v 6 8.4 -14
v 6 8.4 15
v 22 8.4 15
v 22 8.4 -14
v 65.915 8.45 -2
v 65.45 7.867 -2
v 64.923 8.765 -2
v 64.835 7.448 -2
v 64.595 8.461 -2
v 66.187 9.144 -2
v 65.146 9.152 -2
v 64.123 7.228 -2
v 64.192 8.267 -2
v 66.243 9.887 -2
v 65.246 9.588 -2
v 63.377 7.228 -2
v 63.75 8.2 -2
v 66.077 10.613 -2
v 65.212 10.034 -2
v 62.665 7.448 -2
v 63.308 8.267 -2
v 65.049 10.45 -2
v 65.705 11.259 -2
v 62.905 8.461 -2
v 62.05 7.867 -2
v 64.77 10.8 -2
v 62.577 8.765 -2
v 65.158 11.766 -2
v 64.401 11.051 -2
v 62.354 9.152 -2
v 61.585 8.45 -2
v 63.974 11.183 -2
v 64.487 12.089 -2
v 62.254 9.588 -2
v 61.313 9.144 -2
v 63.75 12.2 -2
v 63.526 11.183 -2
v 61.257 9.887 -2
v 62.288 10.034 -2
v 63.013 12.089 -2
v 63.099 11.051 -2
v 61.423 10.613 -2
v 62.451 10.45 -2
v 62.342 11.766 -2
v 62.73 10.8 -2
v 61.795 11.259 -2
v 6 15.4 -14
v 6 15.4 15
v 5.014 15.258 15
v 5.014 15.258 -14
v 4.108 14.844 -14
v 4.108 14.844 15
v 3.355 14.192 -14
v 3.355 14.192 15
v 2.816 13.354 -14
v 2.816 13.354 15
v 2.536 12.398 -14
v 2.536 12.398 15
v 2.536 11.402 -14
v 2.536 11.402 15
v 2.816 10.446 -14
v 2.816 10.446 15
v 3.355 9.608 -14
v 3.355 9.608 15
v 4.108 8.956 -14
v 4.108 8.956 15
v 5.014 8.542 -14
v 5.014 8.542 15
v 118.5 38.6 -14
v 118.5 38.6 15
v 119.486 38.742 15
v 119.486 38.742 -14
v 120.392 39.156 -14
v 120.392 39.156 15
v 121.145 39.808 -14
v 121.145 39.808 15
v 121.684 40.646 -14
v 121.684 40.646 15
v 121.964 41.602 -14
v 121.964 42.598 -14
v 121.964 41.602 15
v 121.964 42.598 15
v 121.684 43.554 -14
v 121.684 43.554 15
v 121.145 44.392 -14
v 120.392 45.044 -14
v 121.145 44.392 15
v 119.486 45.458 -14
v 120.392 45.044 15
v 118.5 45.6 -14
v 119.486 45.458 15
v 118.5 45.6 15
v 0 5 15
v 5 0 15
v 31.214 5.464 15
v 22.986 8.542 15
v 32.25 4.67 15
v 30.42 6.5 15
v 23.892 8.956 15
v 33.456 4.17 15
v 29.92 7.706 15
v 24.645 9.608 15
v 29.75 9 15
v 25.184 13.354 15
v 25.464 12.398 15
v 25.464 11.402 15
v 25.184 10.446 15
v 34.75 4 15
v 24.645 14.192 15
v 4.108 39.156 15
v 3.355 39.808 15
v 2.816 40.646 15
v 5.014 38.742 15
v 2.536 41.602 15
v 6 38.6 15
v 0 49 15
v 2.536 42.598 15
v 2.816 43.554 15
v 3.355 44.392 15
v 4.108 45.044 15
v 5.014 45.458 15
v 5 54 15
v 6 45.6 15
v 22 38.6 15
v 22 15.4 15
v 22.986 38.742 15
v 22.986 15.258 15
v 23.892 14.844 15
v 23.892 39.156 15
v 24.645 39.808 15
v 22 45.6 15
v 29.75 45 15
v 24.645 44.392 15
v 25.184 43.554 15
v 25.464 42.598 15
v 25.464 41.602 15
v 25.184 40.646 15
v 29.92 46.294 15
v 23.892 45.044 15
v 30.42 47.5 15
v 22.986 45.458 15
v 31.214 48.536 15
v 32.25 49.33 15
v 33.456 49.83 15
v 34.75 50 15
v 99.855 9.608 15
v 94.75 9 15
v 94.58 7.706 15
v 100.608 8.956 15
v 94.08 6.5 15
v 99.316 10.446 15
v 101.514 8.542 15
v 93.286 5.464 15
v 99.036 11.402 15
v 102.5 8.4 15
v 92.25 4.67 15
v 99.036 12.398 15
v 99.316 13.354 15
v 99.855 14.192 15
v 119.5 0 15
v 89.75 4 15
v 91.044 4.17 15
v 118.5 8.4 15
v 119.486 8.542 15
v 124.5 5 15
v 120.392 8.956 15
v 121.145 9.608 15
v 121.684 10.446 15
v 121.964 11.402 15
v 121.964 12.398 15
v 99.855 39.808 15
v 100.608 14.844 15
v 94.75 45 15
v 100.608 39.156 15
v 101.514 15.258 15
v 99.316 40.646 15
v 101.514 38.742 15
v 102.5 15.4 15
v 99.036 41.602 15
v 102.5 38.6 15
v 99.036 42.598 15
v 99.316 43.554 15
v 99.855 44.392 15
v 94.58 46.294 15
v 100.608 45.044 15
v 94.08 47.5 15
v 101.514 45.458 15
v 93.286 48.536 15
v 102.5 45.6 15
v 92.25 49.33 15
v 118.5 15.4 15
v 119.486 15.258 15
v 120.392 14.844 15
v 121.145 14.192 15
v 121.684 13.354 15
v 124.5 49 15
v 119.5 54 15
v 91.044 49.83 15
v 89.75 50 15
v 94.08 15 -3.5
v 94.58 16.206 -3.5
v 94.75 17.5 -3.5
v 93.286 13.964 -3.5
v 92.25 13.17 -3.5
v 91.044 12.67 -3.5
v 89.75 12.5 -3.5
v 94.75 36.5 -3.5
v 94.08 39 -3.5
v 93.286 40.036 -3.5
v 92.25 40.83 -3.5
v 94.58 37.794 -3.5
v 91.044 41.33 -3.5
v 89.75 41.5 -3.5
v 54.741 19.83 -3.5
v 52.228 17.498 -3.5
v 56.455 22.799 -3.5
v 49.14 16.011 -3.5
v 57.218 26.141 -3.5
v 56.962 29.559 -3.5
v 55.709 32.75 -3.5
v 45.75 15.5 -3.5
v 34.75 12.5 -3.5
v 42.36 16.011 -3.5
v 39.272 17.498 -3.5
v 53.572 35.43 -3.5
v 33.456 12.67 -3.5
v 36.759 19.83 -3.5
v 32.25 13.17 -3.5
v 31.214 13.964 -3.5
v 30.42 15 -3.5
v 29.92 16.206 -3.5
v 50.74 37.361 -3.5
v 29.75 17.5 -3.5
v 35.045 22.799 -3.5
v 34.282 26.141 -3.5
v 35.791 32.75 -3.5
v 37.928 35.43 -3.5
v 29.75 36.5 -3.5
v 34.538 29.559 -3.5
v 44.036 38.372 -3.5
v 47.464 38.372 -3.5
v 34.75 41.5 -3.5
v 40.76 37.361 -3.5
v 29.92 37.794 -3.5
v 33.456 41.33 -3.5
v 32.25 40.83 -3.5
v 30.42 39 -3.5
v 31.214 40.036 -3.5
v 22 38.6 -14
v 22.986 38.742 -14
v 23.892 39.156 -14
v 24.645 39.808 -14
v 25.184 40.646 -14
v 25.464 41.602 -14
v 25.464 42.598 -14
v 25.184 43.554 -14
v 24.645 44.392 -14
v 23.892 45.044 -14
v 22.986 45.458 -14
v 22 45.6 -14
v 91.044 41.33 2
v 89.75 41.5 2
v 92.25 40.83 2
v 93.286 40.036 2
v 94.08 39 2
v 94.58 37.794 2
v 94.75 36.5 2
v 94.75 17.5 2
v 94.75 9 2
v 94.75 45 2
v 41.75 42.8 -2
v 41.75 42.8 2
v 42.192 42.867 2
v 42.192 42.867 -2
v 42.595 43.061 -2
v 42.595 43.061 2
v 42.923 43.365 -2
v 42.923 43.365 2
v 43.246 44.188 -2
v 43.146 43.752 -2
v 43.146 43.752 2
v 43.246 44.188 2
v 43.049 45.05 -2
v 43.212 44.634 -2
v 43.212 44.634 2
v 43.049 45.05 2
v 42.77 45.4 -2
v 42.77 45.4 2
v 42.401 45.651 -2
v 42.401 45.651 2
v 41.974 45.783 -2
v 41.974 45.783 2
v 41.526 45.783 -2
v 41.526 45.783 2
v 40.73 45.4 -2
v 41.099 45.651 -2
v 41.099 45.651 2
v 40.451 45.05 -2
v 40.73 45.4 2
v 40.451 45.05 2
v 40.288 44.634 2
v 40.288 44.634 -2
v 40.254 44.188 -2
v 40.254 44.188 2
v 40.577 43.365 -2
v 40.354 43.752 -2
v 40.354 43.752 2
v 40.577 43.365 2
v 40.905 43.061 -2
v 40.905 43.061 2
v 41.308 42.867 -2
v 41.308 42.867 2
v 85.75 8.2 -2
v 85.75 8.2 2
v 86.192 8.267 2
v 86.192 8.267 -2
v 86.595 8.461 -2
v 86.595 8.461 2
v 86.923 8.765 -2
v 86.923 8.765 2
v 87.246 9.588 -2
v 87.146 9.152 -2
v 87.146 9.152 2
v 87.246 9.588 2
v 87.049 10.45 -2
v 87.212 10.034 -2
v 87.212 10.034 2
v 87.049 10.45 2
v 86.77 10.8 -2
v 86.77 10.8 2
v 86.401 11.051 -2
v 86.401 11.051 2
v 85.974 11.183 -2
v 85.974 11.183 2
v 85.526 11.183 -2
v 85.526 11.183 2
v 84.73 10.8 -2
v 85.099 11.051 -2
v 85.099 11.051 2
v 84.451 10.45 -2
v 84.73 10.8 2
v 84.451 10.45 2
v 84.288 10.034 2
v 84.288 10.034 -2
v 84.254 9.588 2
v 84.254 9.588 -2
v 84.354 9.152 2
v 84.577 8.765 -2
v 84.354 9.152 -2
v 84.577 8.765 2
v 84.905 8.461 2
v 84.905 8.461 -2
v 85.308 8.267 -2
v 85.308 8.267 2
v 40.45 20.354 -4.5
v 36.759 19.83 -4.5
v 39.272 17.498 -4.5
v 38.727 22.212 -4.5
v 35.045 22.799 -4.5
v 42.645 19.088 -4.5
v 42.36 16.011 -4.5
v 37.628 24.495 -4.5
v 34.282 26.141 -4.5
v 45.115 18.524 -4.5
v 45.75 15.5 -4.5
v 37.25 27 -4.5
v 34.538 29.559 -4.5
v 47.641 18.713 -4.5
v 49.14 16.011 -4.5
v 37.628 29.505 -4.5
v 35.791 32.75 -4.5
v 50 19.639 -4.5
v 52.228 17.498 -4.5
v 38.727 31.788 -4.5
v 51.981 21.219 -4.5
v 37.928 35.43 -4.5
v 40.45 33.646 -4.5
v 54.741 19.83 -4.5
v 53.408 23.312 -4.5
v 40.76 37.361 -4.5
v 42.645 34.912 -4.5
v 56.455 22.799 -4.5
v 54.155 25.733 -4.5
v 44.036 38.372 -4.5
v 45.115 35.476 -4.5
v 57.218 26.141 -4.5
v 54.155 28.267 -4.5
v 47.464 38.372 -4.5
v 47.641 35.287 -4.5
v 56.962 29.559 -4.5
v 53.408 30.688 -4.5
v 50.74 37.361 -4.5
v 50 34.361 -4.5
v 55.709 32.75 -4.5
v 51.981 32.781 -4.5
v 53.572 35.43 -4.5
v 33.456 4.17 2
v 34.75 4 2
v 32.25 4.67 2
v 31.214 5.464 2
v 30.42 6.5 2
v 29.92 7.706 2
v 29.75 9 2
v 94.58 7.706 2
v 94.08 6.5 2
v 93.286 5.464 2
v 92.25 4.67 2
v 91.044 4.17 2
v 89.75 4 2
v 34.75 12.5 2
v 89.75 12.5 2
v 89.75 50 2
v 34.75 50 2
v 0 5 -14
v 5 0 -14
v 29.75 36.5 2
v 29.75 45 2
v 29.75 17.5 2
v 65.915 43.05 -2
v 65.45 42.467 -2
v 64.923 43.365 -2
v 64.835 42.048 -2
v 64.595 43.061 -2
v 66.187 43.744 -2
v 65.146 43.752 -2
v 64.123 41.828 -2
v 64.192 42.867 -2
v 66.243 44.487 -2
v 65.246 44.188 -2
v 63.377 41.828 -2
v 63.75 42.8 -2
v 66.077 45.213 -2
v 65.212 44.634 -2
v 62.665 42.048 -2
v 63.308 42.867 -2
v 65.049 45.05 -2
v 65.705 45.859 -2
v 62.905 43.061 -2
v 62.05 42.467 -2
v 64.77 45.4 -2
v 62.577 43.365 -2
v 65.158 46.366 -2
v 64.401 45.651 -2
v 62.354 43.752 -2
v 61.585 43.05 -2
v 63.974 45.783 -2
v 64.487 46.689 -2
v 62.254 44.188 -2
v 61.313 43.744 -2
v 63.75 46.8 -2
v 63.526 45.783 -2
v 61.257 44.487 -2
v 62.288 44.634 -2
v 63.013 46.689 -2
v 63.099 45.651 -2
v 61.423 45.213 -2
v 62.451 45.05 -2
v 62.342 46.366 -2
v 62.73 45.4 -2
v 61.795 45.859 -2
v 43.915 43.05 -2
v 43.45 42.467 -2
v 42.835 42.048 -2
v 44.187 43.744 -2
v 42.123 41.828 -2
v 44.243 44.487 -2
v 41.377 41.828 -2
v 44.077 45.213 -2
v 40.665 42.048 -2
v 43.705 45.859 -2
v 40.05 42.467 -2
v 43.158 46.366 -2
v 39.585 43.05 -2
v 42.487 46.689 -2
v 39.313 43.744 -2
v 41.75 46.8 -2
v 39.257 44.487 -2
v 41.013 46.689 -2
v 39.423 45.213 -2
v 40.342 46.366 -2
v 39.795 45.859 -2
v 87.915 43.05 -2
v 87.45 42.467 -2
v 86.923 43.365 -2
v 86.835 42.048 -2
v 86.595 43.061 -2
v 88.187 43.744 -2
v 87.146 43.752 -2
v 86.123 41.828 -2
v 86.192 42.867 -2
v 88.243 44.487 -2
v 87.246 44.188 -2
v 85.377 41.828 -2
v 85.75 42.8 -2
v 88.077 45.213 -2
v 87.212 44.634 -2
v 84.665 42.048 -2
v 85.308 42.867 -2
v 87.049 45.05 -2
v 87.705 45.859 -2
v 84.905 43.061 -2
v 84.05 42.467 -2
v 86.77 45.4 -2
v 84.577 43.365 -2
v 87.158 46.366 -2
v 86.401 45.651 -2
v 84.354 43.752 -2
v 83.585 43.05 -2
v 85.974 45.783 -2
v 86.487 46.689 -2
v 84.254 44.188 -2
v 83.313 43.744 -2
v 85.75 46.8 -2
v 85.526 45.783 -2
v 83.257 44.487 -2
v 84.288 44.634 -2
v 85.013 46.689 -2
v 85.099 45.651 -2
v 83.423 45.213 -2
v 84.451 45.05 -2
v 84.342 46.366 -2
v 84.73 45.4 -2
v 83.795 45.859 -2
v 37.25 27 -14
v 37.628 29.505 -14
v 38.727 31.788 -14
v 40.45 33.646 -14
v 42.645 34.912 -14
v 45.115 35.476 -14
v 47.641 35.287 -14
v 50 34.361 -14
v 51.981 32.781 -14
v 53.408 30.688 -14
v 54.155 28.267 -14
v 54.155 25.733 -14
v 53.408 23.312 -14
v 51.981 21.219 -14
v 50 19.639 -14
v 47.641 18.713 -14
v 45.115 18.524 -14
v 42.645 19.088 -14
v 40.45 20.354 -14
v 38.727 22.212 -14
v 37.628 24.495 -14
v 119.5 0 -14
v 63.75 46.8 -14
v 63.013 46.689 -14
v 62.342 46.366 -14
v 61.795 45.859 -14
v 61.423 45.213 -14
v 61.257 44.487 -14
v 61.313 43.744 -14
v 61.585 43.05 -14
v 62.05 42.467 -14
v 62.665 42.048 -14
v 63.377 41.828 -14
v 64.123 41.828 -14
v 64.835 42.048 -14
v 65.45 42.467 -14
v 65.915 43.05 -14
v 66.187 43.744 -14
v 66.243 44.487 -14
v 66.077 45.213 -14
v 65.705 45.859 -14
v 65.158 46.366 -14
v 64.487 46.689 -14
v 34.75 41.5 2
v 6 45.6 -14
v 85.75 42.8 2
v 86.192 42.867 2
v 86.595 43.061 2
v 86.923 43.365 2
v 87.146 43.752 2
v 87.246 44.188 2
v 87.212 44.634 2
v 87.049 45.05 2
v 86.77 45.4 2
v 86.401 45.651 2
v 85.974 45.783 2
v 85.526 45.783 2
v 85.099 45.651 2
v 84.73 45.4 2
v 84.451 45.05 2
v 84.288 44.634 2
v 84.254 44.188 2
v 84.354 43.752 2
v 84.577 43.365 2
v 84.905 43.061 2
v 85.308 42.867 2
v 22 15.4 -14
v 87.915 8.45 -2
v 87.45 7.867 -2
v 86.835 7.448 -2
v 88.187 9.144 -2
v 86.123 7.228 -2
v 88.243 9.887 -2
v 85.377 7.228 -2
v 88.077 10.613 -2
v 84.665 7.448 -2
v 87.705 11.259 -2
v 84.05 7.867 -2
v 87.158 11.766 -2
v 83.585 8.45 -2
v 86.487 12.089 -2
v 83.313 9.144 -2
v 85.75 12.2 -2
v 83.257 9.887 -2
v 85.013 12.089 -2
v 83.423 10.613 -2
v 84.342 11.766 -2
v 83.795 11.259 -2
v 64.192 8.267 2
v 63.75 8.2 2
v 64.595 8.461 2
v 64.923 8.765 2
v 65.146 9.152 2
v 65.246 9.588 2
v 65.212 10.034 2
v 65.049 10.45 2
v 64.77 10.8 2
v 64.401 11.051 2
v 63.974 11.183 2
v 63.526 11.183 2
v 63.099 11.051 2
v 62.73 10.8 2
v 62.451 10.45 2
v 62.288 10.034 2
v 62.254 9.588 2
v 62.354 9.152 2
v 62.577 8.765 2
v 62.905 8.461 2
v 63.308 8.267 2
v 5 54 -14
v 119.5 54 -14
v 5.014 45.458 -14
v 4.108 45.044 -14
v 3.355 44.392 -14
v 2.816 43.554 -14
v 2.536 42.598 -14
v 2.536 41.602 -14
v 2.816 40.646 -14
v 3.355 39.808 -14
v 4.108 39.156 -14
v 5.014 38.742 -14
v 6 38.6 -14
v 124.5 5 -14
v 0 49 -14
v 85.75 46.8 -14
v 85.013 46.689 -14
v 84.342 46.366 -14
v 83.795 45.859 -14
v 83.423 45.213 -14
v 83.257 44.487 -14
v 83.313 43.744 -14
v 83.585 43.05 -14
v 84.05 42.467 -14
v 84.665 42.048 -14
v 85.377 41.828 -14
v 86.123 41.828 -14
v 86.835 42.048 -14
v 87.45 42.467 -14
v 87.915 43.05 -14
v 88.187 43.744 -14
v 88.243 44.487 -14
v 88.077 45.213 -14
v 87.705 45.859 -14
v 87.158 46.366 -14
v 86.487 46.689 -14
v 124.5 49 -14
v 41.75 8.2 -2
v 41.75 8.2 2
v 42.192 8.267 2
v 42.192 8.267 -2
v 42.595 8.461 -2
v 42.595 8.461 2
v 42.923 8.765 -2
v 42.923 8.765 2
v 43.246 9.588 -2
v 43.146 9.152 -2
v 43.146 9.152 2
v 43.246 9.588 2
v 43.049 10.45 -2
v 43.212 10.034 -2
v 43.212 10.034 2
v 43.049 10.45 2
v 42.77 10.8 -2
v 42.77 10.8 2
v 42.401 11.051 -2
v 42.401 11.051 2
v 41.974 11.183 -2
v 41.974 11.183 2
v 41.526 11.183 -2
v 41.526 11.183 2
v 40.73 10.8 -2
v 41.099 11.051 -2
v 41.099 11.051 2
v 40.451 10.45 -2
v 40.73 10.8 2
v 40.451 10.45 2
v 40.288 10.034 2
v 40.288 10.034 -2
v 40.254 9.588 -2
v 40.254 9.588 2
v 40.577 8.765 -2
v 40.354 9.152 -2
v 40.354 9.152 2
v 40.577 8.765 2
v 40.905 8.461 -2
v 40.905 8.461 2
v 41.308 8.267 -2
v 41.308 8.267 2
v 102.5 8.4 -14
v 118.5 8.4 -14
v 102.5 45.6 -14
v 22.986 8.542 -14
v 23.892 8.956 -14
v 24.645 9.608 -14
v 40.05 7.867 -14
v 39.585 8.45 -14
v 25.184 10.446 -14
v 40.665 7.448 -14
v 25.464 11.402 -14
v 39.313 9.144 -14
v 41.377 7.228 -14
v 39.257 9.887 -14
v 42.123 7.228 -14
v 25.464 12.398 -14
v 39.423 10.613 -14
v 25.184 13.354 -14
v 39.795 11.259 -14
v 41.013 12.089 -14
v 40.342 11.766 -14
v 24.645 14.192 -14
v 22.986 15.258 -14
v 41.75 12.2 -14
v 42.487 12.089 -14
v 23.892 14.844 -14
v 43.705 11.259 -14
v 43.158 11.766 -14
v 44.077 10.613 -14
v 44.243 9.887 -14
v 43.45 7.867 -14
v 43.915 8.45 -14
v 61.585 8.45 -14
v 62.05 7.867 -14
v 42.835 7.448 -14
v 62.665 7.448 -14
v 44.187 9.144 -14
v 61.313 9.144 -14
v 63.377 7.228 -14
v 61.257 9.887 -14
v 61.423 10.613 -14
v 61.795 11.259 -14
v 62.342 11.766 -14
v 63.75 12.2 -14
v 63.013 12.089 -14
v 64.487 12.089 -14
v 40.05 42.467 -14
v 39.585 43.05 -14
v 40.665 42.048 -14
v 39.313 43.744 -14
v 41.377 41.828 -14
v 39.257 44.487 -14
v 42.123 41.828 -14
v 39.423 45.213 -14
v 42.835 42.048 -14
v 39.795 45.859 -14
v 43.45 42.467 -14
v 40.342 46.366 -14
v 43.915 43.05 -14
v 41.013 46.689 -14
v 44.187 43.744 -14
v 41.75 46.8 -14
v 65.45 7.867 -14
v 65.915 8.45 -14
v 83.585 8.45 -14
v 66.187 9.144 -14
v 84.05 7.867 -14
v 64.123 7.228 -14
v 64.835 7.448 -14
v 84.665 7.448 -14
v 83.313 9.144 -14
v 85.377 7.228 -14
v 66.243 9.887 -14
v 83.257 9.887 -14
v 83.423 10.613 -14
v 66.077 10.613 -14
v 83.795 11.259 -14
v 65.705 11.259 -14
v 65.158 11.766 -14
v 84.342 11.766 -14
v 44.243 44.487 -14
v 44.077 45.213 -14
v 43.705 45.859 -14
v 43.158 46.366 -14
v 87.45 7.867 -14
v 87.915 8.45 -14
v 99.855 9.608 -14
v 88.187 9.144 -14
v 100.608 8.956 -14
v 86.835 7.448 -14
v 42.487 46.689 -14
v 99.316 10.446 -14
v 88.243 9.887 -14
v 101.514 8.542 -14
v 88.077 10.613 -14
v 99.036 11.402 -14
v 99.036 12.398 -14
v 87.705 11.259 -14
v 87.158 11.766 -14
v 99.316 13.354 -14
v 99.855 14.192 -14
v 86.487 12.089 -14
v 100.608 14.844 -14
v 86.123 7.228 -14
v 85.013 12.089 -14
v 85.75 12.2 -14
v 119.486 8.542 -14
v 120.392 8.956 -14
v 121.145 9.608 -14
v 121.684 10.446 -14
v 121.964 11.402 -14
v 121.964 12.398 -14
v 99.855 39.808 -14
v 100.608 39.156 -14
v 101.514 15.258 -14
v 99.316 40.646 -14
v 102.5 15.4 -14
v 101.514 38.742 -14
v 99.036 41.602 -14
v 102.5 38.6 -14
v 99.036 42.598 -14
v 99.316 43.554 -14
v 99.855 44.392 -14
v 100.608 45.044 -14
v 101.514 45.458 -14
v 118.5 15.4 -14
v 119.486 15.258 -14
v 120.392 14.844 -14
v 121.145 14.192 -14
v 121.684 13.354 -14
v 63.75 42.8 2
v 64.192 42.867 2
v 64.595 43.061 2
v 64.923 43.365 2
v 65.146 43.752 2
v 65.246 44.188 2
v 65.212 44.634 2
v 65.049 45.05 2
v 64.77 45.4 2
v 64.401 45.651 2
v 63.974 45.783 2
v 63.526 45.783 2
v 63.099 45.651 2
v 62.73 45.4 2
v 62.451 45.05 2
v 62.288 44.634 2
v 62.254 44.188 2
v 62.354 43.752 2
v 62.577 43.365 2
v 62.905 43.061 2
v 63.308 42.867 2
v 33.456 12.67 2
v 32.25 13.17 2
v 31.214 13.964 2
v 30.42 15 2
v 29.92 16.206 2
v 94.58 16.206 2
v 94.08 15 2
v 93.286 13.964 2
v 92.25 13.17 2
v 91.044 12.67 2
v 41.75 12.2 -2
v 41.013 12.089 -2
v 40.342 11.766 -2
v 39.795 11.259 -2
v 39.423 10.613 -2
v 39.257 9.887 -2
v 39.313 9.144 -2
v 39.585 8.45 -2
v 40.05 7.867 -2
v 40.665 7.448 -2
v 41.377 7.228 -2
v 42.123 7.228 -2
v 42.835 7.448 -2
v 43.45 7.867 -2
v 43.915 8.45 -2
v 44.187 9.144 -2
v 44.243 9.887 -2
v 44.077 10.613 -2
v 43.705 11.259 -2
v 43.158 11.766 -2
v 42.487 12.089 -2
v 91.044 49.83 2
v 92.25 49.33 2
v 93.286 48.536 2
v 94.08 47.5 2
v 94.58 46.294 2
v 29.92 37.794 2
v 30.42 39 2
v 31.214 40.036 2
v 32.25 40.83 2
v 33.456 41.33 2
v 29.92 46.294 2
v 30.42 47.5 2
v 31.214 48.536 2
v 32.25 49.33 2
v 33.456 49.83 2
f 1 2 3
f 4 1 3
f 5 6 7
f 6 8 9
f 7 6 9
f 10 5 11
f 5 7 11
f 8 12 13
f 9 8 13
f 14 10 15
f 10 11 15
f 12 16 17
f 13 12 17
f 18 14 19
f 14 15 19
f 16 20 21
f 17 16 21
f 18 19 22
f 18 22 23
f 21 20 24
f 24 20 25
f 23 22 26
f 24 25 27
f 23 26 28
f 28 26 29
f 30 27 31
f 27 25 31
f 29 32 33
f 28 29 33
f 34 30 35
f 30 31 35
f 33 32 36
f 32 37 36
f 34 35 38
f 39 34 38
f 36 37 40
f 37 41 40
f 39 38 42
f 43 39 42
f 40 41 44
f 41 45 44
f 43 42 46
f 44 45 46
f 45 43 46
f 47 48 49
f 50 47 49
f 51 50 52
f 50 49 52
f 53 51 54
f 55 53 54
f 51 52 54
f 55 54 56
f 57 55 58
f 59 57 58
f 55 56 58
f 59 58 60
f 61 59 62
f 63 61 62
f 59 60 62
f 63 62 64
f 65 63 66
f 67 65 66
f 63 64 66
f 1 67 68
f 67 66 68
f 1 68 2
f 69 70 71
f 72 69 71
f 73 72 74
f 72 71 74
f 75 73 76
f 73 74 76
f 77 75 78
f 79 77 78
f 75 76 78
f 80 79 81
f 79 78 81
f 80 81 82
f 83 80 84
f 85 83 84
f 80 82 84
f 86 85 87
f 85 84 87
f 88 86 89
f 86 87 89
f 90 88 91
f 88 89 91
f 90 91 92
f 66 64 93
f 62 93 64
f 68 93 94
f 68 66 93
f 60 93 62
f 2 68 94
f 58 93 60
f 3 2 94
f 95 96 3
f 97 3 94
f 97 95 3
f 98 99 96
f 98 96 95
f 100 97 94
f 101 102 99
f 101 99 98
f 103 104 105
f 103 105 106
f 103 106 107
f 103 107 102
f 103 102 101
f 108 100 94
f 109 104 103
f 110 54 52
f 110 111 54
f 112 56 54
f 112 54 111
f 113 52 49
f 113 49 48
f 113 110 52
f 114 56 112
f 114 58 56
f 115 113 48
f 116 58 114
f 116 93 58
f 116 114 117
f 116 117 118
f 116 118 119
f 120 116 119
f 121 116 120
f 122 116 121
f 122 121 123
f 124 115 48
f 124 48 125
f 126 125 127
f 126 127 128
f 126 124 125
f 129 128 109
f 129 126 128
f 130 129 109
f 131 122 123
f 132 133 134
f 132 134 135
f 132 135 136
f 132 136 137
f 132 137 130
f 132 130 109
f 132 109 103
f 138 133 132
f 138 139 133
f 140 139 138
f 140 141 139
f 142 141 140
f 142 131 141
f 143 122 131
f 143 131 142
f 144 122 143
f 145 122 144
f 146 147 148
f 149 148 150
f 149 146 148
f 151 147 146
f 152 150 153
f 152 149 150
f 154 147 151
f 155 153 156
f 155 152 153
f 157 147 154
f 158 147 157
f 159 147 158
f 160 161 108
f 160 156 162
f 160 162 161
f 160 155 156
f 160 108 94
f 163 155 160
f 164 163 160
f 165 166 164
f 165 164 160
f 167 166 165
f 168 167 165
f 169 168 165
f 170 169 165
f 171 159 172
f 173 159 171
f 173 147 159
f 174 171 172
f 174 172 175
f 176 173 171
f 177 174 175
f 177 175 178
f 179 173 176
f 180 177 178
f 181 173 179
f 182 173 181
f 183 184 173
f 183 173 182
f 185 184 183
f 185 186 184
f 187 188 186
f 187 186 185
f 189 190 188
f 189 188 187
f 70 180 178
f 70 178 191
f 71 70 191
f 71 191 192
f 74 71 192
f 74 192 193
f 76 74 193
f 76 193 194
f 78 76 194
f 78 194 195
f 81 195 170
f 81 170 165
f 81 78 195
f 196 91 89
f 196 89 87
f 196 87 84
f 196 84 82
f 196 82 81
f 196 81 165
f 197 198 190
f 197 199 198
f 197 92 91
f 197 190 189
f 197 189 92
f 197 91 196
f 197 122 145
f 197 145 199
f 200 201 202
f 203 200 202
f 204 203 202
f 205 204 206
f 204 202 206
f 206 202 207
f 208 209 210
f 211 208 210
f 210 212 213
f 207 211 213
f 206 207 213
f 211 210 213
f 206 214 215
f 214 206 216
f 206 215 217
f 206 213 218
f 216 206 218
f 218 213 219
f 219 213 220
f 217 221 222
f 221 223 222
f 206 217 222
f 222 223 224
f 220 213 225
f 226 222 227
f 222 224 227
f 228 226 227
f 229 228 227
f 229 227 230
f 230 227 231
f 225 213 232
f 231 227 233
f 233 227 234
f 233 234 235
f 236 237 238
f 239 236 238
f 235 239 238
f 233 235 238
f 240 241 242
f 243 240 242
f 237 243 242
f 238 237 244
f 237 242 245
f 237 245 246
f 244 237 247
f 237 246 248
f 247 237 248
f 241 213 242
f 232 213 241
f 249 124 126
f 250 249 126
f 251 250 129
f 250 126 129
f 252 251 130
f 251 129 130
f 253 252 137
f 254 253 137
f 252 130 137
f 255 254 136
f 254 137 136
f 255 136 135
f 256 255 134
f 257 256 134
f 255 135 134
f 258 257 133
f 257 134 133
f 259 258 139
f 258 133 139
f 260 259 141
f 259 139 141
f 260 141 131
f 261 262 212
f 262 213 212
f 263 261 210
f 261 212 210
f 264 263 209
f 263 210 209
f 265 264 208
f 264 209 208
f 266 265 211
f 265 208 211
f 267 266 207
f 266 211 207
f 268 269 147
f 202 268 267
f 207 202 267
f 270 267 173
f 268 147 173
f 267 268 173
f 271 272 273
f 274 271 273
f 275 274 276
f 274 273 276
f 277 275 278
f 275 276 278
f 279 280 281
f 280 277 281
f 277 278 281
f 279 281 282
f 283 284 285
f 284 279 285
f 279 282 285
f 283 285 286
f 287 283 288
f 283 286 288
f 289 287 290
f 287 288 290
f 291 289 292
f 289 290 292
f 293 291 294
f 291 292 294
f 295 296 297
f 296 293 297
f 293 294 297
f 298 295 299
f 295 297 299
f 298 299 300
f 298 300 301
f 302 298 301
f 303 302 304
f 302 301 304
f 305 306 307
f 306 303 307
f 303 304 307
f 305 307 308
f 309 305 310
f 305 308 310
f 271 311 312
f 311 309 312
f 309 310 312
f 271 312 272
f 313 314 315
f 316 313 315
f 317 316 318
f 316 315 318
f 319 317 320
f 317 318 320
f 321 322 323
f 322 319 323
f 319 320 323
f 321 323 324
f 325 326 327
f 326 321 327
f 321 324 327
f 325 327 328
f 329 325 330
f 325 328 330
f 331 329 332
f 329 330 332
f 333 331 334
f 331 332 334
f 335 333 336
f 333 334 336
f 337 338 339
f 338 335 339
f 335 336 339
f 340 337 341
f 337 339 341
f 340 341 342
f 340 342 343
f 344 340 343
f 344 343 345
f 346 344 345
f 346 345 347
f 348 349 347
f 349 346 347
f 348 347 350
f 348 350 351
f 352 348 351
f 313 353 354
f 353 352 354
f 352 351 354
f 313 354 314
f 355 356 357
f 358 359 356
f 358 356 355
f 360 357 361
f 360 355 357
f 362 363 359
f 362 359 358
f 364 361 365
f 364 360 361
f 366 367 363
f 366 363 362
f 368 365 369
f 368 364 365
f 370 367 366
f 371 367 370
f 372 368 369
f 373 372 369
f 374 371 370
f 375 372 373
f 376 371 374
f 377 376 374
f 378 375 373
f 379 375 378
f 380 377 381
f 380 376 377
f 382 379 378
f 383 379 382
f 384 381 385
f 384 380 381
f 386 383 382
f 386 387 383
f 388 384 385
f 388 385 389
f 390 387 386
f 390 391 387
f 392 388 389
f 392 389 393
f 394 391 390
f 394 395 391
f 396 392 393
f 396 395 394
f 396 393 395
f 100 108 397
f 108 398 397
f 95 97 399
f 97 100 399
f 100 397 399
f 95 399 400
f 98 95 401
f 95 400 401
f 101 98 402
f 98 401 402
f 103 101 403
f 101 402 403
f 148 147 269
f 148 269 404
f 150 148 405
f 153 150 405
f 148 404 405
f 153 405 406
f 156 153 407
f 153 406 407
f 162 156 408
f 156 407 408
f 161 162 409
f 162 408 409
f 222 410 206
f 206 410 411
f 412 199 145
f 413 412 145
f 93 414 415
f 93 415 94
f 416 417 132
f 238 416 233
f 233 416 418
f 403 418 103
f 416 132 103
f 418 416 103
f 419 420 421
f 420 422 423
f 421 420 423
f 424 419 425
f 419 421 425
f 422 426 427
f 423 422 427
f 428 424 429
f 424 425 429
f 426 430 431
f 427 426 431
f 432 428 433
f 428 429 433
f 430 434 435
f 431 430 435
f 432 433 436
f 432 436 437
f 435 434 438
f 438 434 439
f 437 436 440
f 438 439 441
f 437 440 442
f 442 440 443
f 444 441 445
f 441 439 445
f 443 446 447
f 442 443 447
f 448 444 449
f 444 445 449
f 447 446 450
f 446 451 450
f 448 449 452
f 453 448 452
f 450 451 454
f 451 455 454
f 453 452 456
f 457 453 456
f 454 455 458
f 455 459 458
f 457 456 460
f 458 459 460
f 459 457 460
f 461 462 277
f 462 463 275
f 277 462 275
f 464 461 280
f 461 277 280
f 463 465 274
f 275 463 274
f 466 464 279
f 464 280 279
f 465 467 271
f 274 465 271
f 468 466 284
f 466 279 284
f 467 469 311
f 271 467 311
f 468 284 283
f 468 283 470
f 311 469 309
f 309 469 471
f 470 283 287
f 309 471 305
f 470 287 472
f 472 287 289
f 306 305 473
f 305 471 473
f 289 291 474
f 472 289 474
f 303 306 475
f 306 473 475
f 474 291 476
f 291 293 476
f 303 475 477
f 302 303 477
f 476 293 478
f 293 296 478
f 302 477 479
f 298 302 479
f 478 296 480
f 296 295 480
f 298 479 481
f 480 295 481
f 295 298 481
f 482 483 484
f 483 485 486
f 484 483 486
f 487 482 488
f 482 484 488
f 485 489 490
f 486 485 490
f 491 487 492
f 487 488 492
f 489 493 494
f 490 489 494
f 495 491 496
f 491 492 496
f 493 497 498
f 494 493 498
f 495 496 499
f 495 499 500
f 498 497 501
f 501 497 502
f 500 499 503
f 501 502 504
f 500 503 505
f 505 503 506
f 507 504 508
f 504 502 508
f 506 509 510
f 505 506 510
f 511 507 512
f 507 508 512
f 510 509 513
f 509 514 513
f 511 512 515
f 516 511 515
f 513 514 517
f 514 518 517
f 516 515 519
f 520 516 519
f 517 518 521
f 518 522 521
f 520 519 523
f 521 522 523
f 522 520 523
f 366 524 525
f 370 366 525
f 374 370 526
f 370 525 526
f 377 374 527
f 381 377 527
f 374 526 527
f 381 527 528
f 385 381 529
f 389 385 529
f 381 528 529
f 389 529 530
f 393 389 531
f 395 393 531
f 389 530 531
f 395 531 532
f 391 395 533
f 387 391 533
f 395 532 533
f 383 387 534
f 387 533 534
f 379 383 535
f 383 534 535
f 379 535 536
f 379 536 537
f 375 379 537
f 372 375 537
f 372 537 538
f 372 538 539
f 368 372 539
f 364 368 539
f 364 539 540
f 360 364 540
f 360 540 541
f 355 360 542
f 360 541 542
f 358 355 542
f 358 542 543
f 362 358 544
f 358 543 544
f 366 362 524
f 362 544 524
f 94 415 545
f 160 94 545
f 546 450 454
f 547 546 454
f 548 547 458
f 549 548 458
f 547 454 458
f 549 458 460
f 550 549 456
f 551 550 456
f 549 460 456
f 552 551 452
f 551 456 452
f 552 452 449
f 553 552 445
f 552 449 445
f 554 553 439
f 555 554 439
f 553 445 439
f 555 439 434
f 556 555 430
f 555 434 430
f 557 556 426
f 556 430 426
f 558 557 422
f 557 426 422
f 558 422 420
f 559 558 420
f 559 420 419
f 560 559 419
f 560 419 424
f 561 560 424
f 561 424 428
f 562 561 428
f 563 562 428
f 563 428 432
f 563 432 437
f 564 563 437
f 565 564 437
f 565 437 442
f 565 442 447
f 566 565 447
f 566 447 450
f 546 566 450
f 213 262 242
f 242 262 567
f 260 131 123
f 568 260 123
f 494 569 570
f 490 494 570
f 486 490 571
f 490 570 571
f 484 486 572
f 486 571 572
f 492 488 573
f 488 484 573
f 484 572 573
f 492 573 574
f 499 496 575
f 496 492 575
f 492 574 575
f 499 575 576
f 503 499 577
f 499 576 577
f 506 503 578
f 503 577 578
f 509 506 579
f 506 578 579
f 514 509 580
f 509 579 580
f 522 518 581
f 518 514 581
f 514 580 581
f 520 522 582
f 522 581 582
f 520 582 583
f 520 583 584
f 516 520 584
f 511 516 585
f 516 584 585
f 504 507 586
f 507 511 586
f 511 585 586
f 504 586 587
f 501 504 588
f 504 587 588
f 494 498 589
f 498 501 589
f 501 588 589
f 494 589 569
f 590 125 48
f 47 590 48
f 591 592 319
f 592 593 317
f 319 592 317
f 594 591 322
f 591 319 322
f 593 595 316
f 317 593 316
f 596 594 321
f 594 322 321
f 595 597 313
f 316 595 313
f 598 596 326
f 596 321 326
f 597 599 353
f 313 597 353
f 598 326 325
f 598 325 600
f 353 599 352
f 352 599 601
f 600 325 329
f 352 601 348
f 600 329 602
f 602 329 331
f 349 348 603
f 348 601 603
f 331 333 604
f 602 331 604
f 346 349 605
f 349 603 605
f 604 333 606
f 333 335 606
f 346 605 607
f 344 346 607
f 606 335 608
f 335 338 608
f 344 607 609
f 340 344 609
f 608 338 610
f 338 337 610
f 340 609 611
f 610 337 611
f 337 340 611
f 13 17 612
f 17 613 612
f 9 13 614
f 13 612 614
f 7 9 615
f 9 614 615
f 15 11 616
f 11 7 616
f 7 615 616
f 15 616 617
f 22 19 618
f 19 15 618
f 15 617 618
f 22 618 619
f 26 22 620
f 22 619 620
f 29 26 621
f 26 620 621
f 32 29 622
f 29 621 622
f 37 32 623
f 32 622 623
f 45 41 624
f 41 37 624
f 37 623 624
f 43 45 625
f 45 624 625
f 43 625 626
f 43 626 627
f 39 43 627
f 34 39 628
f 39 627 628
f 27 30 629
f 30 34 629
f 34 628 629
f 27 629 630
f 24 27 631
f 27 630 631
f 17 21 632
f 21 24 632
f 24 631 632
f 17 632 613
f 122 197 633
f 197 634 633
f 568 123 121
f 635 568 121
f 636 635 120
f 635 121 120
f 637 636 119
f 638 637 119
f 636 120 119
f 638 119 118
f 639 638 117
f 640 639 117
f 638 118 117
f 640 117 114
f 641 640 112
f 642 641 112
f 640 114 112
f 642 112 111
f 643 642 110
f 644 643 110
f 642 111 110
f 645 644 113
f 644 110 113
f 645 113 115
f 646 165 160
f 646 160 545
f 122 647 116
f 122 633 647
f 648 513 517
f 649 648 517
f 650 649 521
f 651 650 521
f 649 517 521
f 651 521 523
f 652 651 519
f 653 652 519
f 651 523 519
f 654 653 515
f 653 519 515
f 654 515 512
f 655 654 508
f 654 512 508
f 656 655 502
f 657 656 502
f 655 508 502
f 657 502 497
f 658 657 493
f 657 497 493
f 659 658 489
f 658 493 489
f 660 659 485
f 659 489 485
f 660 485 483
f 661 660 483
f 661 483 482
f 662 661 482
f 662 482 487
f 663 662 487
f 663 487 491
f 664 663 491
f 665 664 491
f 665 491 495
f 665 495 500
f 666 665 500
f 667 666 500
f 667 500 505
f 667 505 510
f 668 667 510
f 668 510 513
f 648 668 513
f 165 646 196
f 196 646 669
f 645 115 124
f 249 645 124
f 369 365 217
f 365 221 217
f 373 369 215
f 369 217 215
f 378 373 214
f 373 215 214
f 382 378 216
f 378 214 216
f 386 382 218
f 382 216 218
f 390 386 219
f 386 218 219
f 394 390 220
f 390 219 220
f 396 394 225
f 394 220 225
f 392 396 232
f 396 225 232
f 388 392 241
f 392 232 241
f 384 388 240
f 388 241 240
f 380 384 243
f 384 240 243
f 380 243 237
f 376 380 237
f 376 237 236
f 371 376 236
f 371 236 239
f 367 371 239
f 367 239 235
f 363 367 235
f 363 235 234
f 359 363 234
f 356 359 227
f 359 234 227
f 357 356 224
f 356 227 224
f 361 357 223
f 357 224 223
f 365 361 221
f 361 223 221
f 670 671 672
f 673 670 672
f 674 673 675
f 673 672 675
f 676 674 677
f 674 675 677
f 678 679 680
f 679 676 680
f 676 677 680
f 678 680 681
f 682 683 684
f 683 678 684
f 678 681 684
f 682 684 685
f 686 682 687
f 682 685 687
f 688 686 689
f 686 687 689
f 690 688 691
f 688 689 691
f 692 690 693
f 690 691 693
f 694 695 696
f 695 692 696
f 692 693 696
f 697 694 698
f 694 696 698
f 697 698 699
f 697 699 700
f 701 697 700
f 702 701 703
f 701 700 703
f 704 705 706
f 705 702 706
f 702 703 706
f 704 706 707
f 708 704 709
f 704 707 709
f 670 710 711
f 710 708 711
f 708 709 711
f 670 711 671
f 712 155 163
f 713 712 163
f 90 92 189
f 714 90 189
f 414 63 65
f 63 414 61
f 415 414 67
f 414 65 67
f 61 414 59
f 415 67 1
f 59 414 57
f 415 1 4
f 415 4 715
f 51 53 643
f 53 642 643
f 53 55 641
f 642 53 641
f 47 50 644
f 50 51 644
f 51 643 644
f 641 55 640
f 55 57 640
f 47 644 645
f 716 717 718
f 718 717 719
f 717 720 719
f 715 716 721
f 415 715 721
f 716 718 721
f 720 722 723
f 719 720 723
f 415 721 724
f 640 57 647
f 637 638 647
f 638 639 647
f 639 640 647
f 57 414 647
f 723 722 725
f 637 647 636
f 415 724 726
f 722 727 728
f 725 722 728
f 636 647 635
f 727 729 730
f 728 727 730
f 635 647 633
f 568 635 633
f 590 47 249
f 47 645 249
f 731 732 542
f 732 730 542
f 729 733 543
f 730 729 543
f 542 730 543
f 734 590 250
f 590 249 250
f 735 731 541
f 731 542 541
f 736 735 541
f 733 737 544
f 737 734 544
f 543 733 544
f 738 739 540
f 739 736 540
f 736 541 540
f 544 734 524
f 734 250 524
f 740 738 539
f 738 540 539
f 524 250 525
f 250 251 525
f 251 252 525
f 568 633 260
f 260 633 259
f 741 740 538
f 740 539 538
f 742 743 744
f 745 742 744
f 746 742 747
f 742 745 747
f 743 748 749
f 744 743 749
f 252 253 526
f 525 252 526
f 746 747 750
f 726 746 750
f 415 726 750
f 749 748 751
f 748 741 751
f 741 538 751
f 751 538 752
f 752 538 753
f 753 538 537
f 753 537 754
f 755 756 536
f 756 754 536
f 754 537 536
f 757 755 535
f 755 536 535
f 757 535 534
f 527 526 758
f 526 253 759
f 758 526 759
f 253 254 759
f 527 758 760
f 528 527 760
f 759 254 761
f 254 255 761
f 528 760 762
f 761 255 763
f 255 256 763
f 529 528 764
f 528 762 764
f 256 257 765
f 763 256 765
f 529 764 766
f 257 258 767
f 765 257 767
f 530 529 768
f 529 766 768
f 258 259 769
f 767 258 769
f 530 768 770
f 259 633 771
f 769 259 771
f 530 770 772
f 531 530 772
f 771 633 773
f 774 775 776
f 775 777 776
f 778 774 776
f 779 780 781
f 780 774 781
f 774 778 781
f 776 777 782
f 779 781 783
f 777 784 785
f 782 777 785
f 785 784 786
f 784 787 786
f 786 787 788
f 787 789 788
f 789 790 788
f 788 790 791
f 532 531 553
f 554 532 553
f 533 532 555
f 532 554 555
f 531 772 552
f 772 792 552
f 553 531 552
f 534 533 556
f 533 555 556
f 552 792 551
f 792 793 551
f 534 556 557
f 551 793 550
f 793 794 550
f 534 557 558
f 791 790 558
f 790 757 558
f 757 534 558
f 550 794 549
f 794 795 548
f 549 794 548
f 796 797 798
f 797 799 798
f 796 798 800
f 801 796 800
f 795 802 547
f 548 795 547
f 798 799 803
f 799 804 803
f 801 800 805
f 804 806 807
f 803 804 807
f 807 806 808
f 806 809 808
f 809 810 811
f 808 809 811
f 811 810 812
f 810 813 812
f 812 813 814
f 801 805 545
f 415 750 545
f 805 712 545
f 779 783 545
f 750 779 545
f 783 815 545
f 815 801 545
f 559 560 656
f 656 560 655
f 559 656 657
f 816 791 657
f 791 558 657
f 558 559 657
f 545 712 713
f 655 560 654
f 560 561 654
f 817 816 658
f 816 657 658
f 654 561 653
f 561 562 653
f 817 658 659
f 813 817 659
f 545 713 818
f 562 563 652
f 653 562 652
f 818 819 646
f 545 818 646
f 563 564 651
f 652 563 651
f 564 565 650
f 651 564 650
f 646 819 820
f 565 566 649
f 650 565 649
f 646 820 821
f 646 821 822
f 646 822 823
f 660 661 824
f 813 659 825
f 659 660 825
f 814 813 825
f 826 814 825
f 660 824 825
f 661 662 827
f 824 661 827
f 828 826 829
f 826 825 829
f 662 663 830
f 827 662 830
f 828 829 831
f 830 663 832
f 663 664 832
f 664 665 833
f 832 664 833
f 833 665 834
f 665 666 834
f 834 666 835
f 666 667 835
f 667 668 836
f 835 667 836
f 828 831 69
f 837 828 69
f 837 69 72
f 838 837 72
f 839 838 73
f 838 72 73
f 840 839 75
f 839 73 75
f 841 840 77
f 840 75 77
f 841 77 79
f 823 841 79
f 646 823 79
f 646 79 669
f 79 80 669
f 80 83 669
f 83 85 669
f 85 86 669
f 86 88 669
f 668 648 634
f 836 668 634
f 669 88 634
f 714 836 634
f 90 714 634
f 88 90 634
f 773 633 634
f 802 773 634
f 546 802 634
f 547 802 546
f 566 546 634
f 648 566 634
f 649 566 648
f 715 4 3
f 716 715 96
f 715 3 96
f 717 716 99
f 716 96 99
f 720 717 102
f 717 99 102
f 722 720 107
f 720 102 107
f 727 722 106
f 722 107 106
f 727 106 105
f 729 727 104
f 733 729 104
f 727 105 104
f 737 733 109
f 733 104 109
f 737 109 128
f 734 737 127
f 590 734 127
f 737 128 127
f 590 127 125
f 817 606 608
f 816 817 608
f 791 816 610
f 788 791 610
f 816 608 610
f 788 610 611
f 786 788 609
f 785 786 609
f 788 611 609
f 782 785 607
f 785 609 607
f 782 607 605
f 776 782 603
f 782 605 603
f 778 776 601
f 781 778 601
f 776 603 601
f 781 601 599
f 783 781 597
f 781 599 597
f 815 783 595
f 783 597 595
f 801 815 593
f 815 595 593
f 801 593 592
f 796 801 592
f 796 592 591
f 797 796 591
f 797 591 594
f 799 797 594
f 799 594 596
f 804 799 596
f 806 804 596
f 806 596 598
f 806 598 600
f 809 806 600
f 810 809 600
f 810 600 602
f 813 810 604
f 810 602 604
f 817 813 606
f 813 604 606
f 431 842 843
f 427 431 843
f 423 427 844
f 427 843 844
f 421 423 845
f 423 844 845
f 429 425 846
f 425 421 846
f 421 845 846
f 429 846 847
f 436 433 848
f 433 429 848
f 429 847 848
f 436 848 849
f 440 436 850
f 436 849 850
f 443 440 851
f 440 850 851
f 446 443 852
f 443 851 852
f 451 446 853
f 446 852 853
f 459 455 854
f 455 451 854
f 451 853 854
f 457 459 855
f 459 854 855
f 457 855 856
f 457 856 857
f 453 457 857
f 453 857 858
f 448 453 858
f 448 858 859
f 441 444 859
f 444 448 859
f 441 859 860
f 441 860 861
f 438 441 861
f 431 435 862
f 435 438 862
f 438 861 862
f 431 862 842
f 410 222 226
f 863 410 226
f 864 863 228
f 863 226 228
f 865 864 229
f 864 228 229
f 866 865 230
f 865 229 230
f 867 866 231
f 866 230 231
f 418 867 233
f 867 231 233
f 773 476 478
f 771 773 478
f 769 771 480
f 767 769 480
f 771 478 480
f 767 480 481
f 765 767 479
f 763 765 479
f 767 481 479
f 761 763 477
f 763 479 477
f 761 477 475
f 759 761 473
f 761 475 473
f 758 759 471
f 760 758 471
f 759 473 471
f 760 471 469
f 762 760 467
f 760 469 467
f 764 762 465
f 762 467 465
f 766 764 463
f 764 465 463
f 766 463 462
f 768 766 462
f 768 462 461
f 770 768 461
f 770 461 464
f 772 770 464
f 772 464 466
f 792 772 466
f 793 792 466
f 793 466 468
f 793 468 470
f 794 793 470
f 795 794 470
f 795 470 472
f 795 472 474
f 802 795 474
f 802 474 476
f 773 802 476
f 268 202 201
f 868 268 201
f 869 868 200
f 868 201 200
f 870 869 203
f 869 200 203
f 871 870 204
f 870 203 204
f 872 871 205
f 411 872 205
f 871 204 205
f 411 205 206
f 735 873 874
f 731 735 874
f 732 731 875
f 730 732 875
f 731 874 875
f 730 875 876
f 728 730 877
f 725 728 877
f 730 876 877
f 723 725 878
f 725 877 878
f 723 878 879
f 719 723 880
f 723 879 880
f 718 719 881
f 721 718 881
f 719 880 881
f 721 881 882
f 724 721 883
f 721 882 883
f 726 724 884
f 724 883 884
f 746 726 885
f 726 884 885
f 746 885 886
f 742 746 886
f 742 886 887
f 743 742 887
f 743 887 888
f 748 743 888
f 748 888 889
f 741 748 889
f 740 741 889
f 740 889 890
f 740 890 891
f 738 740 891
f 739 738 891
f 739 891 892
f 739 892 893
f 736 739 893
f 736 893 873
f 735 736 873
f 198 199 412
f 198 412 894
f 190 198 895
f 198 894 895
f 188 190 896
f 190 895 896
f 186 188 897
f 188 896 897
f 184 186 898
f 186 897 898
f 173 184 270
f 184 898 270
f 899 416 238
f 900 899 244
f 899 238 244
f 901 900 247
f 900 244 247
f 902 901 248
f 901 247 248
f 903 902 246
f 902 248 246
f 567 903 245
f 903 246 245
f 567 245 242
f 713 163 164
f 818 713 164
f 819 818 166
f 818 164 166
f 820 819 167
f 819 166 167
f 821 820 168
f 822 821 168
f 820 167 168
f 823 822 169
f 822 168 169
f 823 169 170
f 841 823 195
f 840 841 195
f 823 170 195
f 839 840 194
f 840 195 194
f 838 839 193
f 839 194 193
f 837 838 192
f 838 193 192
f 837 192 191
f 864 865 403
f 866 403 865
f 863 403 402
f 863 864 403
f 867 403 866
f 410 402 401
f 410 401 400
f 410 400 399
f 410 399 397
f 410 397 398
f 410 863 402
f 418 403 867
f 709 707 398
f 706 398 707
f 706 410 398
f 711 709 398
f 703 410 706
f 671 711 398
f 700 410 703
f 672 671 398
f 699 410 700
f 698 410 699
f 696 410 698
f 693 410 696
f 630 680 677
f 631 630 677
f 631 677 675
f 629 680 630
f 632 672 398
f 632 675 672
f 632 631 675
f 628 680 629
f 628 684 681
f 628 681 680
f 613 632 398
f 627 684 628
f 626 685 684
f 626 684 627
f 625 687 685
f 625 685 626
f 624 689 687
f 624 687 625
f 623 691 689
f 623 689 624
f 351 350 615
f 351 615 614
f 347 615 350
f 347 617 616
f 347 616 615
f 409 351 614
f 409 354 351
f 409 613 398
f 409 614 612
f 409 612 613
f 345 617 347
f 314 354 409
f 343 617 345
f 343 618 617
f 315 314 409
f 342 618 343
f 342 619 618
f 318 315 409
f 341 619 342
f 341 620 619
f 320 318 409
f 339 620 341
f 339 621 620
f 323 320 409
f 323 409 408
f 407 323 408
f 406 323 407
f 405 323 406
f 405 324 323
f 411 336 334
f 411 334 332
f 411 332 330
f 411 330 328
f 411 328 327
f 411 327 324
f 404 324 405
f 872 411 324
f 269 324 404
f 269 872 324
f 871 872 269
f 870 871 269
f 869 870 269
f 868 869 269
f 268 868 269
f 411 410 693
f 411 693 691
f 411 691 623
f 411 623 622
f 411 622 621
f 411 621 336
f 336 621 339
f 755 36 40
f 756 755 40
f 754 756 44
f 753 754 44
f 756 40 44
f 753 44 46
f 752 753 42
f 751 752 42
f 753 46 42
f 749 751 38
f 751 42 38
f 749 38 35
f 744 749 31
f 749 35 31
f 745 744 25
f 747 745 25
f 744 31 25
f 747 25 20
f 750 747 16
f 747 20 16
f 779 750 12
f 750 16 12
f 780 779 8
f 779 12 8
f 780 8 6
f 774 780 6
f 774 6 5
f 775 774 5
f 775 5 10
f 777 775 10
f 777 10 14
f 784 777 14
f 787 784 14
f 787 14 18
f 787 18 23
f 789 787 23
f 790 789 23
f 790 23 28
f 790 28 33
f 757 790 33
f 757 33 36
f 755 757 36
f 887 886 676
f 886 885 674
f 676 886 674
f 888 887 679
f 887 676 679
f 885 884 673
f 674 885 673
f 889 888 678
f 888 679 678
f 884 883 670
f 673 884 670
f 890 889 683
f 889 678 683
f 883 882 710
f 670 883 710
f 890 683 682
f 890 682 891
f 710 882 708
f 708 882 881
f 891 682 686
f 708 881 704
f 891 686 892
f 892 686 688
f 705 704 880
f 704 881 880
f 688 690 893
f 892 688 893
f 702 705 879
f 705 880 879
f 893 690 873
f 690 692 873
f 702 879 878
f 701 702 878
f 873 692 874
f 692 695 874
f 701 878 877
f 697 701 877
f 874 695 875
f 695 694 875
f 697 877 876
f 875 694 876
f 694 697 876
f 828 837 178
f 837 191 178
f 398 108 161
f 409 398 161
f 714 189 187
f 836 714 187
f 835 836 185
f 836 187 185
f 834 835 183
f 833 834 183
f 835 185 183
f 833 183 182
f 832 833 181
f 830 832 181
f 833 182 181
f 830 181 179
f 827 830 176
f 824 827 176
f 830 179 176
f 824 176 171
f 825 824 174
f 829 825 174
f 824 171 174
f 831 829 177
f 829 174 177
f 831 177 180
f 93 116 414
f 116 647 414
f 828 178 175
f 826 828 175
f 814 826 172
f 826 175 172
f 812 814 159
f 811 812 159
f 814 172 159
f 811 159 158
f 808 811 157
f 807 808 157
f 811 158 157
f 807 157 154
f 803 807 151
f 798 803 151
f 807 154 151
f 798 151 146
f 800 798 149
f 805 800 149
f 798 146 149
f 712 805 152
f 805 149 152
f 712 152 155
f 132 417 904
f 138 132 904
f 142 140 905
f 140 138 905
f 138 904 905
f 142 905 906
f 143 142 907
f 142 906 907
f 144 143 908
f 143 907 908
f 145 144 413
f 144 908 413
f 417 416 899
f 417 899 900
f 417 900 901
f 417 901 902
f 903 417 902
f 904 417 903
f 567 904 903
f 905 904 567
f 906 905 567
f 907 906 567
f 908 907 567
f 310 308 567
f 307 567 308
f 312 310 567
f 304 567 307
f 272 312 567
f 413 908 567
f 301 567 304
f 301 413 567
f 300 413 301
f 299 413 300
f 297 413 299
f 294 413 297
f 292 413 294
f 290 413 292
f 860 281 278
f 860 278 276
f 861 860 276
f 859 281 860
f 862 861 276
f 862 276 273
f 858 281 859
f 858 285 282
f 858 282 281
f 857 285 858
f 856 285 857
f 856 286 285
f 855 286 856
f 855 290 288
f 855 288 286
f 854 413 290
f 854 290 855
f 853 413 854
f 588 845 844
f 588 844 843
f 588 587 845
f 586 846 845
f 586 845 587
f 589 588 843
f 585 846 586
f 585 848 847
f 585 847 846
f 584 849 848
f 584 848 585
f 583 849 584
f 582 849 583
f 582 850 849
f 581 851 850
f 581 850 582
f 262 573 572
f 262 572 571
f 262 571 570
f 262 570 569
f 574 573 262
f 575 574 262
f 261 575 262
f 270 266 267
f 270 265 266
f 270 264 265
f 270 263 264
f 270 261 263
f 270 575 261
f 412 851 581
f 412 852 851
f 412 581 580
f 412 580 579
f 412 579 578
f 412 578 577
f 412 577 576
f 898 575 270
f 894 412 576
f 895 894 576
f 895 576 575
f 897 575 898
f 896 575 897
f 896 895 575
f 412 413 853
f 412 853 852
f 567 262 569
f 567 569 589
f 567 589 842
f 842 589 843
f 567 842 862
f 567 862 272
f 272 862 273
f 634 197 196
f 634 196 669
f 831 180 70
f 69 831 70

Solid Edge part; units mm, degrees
sketch "Sketch1" plane through (0, 0, 0) normal (0, 0, 1) x (1, 0, 0)
  line L0 (0, 0) -> (124.5, 0)
  line L1 (124.5, 0) -> (124.5, 54)
  line L2 (124.5, 54) -> (0, 54)
  line L3 (0, 54) -> (0, 0)
extrude "Protrusion1" add sketch "Sketch1" along normal up to vertex (15 mm away) and the other way up to vertex (17.5 mm away)
chamfer "Chamfer1" distance 5 angle 45 4 edges at (0, 0, -1.25) (124.5, 0, -1.25) (124.5, 54, -1.25) (0, 54, -1.25)
sketch "Sketch2" plane through (62.25, 27, 15) normal (0, 0, 1) x (1, 0, 0)
  line L0 (-56.25, 11.6) -> (-40.25, 11.6)
  arc A0 (-40.25, 11.6) -> (-36.75, 15.1) centre (-40.25, 15.1) ccw
  arc A1 (-36.75, 15.1) -> (-40.25, 18.6) centre (-40.25, 15.1) ccw
  line L1 (-40.25, 18.6) -> (-56.25, 18.6)
  arc A2 (-56.25, 18.6) -> (-58.9973, 12.9315) centre (-56.25, 15.1) ccw
  arc A3 (-56.25, 11.6) -> (-58.9973, 12.9315) centre (-56.25, 15.1) cw
extrude "Cutout1" cut sketch "Sketch2" against normal through all
pattern_linear "Pattern1" count 2 spacing 96.5 along (1, 0, 0) count 2 spacing 30.2 along (0, -1, 0) of "Cutout1"
sketch "Sketch3" plane through (62.25, 27, 15) normal (0, 0, 1) x (1, 0, 0)
  line L0 (32.5, 14.5) -> (-32.5, 14.5)
  line L1 (-32.5, 14.5) -> (-32.5, -14.5)
  line L2 (-32.5, -14.5) -> (32.5, -14.5)
  line L3 (32.5, -14.5) -> (32.5, 14.5)
extrude "Cutout2" cut sketch "Sketch3" against normal through all
sketch "Sketch4" plane through (62.25, 27, 15) normal (0, 0, 1) x (1, 0, 0)
  line L0 (32.5, 23) -> (-32.5, 23)
  line L1 (-32.5, 23) -> (-32.5, -23)
  line L2 (-32.5, -23) -> (32.5, -23)
  line L3 (32.5, -23) -> (32.5, 23)
extrude "VaciadoExtruido_3" cut sketch "Sketch4" against normal blind 13
fillet "Redondeo_1" radius 5 8 edges at (29.75, 50, 8.5) (94.75, 50, 8.5) (94.75, 4, 8.5) (94.75, 12.5, -7.75) (94.75, 41.5, -7.75) (29.75, 41.5, -7.75) (29.75, 4, 8.5) (29.75, 12.5, -7.75)
sketch "Sketch5" plane through (62.25, 27, -17.5) normal (0, 0, -1) x (-1, 0, 0)
  line L0 (-32.5, 23) -> (-32.5, -23)
  line L1 (-32.5, -23) -> (32.5, -23)
  line L2 (32.5, -23) -> (32.5, 23)
  line L3 (32.5, 23) -> (-32.5, 23)
extrude "Protrusion2" add sketch "Sketch5" against normal up to vertex (14 mm away)
sketch "Sketch6" plane through (62.25, 27, -17.5) normal (0, 0, -1) x (-1, 0, 0)
  circle A0 centre (16.5, 0) radius 8.5
extrude "Cutout3" cut sketch "Sketch6" against normal up to vertex (14 mm away)
hole "Agujero_1" at (41.75, 9.7, 2) direction (0, 0, -1) diameter 3 end through all
hole "Hole1" at (63.75, 9.7, 2) direction (0, 0, -1) diameter 3 end through all
hole "Hole2" at (85.75, 9.7, 2) direction (0, 0, -1) diameter 3 end through all
hole "Hole3" at (41.75, 44.3, 2) direction (0, 0, -1) diameter 3 end through all
hole "Hole4" at (63.75, 44.3, 2) direction (0, 0, -1) diameter 3 end through all
hole "Hole5" at (85.75, 44.3, 2) direction (0, 0, -1) diameter 3 end through all
sketch "Sketch7" plane through (14, 27, -14) normal (0, 0, -1) x (-1, 0, 0)
  line L0 (15.0837, -36.0096) -> (-114.5837, -36.0096)
  line L1 (-114.5837, -36.0096) -> (-114.5837, 36.0096)
  line L2 (-114.5837, 36.0096) -> (15.0837, 36.0096)
  line L3 (15.0837, 36.0096) -> (15.0837, -36.0096)
extrude "VaciadoExtruido_8" cut sketch "Sketch7" along normal through all
hole "Agujero_7" at (41.75, 9.7, -14) direction (0, 0, 1) diameter 3 end up to next counterbore diameter 5 counterbore depth 12
hole "Hole6" at (63.75, 9.7, -14) direction (0, 0, 1) diameter 3 end up to next counterbore diameter 5 counterbore depth 12
hole "Hole7" at (85.75, 9.7, -14) direction (0, 0, 1) diameter 3 end up to next counterbore diameter 5 counterbore depth 12
hole "Hole8" at (41.75, 44.3, -14) direction (0, 0, 1) diameter 3 end up to next counterbore diameter 5 counterbore depth 12
hole "Hole9" at (63.75, 44.3, -14) direction (0, 0, 1) diameter 3 end up to next counterbore diameter 5 counterbore depth 12
hole "Hole10" at (85.75, 44.3, -14) direction (0, 0, 1) diameter 3 end up to next counterbore diameter 5 counterbore depth 12
sketch "Sketch8" plane through (62.25, 27, -3.5) normal (0, 0, 1) x (0, -1, 0)
  circle A0 centre (0, -16.5) radius 11.5
  dimension "D1" = 23
extrude "VaciadoExtruido_9" cut sketch "Sketch8" against normal blind 1
properties part number "BRAZO2" material "Aluminio, 7075-T6"
